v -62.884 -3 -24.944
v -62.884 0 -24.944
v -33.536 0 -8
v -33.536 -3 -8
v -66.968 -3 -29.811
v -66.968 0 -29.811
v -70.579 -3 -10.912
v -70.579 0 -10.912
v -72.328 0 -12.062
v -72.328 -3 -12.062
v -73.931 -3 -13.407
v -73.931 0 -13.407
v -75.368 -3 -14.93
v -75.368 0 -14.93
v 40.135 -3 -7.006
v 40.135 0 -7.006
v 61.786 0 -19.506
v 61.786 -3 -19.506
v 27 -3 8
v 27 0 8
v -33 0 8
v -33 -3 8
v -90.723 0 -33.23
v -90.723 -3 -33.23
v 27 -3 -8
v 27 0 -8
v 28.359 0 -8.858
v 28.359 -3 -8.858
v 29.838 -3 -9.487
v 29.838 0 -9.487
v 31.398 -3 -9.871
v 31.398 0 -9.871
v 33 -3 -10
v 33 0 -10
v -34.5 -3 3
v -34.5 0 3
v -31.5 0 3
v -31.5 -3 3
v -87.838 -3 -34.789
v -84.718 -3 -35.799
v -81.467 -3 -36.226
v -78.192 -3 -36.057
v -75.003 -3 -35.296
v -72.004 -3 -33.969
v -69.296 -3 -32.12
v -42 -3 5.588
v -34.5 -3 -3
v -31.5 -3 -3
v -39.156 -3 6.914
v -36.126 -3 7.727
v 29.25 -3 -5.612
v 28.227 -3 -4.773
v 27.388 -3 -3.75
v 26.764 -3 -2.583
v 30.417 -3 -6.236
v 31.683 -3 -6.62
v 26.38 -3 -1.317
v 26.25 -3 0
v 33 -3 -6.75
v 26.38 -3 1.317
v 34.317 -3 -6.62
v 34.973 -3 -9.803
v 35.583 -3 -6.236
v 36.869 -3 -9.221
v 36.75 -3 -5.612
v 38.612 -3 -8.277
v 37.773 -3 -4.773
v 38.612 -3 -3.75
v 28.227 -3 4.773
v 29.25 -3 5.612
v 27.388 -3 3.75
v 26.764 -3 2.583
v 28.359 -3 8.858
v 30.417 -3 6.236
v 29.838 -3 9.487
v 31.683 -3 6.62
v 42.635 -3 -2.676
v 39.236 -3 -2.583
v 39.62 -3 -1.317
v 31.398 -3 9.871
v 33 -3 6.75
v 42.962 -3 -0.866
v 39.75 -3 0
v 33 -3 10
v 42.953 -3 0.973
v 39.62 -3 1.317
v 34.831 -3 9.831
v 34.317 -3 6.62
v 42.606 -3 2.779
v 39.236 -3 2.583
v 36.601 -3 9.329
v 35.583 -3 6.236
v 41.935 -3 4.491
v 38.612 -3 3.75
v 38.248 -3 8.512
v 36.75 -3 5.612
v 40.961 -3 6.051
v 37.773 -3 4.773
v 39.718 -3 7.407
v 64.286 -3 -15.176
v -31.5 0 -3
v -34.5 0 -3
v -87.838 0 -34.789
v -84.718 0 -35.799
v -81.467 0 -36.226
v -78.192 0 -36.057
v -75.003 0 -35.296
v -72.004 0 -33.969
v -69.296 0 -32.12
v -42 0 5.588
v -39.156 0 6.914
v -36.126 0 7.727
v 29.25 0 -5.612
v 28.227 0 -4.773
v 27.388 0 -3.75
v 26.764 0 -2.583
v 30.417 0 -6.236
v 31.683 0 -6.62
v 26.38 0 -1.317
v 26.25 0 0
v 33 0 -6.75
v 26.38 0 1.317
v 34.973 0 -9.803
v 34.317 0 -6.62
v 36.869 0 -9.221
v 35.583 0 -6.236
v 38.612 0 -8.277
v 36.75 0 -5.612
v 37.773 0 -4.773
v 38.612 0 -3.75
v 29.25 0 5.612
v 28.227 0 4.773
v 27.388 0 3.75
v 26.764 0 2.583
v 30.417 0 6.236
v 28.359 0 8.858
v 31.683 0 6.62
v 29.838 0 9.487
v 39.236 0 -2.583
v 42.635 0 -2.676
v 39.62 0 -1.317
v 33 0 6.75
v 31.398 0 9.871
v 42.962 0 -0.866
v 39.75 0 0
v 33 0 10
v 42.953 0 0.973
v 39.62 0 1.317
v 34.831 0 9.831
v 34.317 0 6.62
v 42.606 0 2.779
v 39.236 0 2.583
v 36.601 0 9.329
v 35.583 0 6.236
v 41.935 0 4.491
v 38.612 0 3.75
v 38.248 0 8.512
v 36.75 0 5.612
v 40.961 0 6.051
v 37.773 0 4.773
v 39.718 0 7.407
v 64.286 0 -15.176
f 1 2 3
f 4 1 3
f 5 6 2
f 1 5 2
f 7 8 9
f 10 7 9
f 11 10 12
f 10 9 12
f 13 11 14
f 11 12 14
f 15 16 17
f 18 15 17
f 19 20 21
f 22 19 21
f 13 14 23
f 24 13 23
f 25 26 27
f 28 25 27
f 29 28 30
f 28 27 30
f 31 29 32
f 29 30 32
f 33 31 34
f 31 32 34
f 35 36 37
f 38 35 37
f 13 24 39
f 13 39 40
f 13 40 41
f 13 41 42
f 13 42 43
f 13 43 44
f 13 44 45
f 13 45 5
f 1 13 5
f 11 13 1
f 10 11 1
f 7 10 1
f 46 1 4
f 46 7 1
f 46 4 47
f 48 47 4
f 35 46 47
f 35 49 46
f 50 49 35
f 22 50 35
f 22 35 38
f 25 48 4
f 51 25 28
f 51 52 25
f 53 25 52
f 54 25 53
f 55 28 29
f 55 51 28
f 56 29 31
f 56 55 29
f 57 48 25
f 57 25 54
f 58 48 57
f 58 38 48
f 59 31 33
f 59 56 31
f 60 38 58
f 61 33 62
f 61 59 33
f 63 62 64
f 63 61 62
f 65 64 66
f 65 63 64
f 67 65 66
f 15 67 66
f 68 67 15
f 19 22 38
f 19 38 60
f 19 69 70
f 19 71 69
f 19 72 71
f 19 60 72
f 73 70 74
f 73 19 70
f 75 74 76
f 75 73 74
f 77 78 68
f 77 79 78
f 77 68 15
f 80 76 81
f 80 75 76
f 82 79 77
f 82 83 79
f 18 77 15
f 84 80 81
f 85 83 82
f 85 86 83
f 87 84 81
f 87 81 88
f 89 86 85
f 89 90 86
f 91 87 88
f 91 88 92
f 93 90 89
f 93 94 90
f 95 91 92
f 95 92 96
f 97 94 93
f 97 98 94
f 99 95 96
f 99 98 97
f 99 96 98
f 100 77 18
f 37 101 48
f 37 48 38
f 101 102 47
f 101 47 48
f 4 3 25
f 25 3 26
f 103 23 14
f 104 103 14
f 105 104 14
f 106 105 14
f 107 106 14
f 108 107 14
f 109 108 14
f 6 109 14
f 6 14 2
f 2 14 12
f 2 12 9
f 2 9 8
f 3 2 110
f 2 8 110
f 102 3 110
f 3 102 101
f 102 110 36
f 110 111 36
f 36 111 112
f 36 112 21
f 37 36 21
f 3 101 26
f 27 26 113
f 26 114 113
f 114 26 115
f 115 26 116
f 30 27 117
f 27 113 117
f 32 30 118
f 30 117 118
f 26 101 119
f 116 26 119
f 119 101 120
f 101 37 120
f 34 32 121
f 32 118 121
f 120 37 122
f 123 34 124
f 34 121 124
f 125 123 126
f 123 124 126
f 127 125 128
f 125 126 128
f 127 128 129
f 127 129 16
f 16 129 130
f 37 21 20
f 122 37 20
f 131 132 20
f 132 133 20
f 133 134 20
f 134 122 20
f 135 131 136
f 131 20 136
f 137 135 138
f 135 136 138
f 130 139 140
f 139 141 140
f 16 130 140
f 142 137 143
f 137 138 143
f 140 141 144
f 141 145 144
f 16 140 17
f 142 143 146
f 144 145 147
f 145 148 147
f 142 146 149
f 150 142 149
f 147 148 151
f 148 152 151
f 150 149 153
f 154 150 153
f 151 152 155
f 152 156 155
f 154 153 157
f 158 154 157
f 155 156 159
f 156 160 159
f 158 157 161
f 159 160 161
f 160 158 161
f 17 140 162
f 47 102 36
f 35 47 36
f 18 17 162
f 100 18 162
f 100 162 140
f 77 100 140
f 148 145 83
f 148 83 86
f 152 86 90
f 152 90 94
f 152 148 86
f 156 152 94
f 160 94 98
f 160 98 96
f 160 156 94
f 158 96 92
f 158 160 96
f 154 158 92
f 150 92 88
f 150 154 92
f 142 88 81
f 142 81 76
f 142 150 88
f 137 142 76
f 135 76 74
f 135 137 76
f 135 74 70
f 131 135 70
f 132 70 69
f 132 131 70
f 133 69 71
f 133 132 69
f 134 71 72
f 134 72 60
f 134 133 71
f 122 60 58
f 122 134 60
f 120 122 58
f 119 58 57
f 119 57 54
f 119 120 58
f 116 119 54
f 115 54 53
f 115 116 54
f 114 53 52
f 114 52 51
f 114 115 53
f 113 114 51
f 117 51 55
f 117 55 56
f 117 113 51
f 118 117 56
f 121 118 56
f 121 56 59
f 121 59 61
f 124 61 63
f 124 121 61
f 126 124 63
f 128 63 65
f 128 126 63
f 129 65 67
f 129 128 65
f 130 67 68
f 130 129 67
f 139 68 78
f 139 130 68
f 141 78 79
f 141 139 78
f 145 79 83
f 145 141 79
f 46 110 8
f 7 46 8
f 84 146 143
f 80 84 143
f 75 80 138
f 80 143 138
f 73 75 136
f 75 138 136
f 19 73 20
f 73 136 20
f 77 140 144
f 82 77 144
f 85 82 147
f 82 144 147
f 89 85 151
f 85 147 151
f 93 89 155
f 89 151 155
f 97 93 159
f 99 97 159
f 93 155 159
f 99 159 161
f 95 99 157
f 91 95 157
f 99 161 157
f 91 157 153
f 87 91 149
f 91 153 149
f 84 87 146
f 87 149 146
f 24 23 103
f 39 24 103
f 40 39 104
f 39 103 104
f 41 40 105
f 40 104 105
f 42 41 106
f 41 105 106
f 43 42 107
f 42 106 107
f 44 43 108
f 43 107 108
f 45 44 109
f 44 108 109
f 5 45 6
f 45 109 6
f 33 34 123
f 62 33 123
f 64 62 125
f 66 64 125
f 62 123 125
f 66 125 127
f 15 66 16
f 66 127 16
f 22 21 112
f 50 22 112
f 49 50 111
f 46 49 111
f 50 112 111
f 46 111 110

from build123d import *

# Parameters (mm, degrees)
F0_W     = 3
F0_H     = 6
F0_R     = 6.75
F1_DEPTH = 3


with BuildPart() as f1:
    # F0 (on Front) → F1 (new body)
    with BuildSketch(Plane.XZ):
        with BuildLine():
            Line((-62.884246, -24.944276), (-33.535898, -8))
            Line((-33.535898, -8), (27, -8))
            ThreePointArc((27, -8), (29.837722, -9.486833), (33, -10))
            ThreePointArc((33, -10), (36.868919, -9.221251), (40.135255, -7.006293))
            Line((40.135255, -7.006293), (61.78589, -19.506293))
            Line((61.78589, -19.506293), (64.28589, -15.176166))
            Line((64.28589, -15.176166), (42.635255, -2.676166))
            ThreePointArc((42.635255, -2.676166), (40.961208, 6.051378), (33, 10))
            ThreePointArc((33, 10), (29.837722, 9.486833), (27, 8))
            Line((27, 8), (-33, 8))
            ThreePointArc((-33, 8), (-37.658743, 7.386665), (-42, 5.588457))
            Line((-42, 5.588457), (-70.578838, -10.911543))
            ThreePointArc((-70.578838, -10.911543), (-73.149015, -12.7112), (-75.367638, -14.929823))
            Line((-75.367638, -14.929823), (-90.722898, -33.229509))
            ThreePointArc((-90.722898, -33.229509), (-78.192339, -36.056949), (-66.967653, -29.810691))
            Line((-66.967653, -29.810691), (-62.884246, -24.944276))
        make_face()
        with Locations((-33, 0)):
            Rectangle(F0_W, F0_H, mode=Mode.SUBTRACT)
        with Locations((33, 0)):
            Circle(F0_R, mode=Mode.SUBTRACT)
    extrude(amount=F1_DEPTH)


solid = f1.part
